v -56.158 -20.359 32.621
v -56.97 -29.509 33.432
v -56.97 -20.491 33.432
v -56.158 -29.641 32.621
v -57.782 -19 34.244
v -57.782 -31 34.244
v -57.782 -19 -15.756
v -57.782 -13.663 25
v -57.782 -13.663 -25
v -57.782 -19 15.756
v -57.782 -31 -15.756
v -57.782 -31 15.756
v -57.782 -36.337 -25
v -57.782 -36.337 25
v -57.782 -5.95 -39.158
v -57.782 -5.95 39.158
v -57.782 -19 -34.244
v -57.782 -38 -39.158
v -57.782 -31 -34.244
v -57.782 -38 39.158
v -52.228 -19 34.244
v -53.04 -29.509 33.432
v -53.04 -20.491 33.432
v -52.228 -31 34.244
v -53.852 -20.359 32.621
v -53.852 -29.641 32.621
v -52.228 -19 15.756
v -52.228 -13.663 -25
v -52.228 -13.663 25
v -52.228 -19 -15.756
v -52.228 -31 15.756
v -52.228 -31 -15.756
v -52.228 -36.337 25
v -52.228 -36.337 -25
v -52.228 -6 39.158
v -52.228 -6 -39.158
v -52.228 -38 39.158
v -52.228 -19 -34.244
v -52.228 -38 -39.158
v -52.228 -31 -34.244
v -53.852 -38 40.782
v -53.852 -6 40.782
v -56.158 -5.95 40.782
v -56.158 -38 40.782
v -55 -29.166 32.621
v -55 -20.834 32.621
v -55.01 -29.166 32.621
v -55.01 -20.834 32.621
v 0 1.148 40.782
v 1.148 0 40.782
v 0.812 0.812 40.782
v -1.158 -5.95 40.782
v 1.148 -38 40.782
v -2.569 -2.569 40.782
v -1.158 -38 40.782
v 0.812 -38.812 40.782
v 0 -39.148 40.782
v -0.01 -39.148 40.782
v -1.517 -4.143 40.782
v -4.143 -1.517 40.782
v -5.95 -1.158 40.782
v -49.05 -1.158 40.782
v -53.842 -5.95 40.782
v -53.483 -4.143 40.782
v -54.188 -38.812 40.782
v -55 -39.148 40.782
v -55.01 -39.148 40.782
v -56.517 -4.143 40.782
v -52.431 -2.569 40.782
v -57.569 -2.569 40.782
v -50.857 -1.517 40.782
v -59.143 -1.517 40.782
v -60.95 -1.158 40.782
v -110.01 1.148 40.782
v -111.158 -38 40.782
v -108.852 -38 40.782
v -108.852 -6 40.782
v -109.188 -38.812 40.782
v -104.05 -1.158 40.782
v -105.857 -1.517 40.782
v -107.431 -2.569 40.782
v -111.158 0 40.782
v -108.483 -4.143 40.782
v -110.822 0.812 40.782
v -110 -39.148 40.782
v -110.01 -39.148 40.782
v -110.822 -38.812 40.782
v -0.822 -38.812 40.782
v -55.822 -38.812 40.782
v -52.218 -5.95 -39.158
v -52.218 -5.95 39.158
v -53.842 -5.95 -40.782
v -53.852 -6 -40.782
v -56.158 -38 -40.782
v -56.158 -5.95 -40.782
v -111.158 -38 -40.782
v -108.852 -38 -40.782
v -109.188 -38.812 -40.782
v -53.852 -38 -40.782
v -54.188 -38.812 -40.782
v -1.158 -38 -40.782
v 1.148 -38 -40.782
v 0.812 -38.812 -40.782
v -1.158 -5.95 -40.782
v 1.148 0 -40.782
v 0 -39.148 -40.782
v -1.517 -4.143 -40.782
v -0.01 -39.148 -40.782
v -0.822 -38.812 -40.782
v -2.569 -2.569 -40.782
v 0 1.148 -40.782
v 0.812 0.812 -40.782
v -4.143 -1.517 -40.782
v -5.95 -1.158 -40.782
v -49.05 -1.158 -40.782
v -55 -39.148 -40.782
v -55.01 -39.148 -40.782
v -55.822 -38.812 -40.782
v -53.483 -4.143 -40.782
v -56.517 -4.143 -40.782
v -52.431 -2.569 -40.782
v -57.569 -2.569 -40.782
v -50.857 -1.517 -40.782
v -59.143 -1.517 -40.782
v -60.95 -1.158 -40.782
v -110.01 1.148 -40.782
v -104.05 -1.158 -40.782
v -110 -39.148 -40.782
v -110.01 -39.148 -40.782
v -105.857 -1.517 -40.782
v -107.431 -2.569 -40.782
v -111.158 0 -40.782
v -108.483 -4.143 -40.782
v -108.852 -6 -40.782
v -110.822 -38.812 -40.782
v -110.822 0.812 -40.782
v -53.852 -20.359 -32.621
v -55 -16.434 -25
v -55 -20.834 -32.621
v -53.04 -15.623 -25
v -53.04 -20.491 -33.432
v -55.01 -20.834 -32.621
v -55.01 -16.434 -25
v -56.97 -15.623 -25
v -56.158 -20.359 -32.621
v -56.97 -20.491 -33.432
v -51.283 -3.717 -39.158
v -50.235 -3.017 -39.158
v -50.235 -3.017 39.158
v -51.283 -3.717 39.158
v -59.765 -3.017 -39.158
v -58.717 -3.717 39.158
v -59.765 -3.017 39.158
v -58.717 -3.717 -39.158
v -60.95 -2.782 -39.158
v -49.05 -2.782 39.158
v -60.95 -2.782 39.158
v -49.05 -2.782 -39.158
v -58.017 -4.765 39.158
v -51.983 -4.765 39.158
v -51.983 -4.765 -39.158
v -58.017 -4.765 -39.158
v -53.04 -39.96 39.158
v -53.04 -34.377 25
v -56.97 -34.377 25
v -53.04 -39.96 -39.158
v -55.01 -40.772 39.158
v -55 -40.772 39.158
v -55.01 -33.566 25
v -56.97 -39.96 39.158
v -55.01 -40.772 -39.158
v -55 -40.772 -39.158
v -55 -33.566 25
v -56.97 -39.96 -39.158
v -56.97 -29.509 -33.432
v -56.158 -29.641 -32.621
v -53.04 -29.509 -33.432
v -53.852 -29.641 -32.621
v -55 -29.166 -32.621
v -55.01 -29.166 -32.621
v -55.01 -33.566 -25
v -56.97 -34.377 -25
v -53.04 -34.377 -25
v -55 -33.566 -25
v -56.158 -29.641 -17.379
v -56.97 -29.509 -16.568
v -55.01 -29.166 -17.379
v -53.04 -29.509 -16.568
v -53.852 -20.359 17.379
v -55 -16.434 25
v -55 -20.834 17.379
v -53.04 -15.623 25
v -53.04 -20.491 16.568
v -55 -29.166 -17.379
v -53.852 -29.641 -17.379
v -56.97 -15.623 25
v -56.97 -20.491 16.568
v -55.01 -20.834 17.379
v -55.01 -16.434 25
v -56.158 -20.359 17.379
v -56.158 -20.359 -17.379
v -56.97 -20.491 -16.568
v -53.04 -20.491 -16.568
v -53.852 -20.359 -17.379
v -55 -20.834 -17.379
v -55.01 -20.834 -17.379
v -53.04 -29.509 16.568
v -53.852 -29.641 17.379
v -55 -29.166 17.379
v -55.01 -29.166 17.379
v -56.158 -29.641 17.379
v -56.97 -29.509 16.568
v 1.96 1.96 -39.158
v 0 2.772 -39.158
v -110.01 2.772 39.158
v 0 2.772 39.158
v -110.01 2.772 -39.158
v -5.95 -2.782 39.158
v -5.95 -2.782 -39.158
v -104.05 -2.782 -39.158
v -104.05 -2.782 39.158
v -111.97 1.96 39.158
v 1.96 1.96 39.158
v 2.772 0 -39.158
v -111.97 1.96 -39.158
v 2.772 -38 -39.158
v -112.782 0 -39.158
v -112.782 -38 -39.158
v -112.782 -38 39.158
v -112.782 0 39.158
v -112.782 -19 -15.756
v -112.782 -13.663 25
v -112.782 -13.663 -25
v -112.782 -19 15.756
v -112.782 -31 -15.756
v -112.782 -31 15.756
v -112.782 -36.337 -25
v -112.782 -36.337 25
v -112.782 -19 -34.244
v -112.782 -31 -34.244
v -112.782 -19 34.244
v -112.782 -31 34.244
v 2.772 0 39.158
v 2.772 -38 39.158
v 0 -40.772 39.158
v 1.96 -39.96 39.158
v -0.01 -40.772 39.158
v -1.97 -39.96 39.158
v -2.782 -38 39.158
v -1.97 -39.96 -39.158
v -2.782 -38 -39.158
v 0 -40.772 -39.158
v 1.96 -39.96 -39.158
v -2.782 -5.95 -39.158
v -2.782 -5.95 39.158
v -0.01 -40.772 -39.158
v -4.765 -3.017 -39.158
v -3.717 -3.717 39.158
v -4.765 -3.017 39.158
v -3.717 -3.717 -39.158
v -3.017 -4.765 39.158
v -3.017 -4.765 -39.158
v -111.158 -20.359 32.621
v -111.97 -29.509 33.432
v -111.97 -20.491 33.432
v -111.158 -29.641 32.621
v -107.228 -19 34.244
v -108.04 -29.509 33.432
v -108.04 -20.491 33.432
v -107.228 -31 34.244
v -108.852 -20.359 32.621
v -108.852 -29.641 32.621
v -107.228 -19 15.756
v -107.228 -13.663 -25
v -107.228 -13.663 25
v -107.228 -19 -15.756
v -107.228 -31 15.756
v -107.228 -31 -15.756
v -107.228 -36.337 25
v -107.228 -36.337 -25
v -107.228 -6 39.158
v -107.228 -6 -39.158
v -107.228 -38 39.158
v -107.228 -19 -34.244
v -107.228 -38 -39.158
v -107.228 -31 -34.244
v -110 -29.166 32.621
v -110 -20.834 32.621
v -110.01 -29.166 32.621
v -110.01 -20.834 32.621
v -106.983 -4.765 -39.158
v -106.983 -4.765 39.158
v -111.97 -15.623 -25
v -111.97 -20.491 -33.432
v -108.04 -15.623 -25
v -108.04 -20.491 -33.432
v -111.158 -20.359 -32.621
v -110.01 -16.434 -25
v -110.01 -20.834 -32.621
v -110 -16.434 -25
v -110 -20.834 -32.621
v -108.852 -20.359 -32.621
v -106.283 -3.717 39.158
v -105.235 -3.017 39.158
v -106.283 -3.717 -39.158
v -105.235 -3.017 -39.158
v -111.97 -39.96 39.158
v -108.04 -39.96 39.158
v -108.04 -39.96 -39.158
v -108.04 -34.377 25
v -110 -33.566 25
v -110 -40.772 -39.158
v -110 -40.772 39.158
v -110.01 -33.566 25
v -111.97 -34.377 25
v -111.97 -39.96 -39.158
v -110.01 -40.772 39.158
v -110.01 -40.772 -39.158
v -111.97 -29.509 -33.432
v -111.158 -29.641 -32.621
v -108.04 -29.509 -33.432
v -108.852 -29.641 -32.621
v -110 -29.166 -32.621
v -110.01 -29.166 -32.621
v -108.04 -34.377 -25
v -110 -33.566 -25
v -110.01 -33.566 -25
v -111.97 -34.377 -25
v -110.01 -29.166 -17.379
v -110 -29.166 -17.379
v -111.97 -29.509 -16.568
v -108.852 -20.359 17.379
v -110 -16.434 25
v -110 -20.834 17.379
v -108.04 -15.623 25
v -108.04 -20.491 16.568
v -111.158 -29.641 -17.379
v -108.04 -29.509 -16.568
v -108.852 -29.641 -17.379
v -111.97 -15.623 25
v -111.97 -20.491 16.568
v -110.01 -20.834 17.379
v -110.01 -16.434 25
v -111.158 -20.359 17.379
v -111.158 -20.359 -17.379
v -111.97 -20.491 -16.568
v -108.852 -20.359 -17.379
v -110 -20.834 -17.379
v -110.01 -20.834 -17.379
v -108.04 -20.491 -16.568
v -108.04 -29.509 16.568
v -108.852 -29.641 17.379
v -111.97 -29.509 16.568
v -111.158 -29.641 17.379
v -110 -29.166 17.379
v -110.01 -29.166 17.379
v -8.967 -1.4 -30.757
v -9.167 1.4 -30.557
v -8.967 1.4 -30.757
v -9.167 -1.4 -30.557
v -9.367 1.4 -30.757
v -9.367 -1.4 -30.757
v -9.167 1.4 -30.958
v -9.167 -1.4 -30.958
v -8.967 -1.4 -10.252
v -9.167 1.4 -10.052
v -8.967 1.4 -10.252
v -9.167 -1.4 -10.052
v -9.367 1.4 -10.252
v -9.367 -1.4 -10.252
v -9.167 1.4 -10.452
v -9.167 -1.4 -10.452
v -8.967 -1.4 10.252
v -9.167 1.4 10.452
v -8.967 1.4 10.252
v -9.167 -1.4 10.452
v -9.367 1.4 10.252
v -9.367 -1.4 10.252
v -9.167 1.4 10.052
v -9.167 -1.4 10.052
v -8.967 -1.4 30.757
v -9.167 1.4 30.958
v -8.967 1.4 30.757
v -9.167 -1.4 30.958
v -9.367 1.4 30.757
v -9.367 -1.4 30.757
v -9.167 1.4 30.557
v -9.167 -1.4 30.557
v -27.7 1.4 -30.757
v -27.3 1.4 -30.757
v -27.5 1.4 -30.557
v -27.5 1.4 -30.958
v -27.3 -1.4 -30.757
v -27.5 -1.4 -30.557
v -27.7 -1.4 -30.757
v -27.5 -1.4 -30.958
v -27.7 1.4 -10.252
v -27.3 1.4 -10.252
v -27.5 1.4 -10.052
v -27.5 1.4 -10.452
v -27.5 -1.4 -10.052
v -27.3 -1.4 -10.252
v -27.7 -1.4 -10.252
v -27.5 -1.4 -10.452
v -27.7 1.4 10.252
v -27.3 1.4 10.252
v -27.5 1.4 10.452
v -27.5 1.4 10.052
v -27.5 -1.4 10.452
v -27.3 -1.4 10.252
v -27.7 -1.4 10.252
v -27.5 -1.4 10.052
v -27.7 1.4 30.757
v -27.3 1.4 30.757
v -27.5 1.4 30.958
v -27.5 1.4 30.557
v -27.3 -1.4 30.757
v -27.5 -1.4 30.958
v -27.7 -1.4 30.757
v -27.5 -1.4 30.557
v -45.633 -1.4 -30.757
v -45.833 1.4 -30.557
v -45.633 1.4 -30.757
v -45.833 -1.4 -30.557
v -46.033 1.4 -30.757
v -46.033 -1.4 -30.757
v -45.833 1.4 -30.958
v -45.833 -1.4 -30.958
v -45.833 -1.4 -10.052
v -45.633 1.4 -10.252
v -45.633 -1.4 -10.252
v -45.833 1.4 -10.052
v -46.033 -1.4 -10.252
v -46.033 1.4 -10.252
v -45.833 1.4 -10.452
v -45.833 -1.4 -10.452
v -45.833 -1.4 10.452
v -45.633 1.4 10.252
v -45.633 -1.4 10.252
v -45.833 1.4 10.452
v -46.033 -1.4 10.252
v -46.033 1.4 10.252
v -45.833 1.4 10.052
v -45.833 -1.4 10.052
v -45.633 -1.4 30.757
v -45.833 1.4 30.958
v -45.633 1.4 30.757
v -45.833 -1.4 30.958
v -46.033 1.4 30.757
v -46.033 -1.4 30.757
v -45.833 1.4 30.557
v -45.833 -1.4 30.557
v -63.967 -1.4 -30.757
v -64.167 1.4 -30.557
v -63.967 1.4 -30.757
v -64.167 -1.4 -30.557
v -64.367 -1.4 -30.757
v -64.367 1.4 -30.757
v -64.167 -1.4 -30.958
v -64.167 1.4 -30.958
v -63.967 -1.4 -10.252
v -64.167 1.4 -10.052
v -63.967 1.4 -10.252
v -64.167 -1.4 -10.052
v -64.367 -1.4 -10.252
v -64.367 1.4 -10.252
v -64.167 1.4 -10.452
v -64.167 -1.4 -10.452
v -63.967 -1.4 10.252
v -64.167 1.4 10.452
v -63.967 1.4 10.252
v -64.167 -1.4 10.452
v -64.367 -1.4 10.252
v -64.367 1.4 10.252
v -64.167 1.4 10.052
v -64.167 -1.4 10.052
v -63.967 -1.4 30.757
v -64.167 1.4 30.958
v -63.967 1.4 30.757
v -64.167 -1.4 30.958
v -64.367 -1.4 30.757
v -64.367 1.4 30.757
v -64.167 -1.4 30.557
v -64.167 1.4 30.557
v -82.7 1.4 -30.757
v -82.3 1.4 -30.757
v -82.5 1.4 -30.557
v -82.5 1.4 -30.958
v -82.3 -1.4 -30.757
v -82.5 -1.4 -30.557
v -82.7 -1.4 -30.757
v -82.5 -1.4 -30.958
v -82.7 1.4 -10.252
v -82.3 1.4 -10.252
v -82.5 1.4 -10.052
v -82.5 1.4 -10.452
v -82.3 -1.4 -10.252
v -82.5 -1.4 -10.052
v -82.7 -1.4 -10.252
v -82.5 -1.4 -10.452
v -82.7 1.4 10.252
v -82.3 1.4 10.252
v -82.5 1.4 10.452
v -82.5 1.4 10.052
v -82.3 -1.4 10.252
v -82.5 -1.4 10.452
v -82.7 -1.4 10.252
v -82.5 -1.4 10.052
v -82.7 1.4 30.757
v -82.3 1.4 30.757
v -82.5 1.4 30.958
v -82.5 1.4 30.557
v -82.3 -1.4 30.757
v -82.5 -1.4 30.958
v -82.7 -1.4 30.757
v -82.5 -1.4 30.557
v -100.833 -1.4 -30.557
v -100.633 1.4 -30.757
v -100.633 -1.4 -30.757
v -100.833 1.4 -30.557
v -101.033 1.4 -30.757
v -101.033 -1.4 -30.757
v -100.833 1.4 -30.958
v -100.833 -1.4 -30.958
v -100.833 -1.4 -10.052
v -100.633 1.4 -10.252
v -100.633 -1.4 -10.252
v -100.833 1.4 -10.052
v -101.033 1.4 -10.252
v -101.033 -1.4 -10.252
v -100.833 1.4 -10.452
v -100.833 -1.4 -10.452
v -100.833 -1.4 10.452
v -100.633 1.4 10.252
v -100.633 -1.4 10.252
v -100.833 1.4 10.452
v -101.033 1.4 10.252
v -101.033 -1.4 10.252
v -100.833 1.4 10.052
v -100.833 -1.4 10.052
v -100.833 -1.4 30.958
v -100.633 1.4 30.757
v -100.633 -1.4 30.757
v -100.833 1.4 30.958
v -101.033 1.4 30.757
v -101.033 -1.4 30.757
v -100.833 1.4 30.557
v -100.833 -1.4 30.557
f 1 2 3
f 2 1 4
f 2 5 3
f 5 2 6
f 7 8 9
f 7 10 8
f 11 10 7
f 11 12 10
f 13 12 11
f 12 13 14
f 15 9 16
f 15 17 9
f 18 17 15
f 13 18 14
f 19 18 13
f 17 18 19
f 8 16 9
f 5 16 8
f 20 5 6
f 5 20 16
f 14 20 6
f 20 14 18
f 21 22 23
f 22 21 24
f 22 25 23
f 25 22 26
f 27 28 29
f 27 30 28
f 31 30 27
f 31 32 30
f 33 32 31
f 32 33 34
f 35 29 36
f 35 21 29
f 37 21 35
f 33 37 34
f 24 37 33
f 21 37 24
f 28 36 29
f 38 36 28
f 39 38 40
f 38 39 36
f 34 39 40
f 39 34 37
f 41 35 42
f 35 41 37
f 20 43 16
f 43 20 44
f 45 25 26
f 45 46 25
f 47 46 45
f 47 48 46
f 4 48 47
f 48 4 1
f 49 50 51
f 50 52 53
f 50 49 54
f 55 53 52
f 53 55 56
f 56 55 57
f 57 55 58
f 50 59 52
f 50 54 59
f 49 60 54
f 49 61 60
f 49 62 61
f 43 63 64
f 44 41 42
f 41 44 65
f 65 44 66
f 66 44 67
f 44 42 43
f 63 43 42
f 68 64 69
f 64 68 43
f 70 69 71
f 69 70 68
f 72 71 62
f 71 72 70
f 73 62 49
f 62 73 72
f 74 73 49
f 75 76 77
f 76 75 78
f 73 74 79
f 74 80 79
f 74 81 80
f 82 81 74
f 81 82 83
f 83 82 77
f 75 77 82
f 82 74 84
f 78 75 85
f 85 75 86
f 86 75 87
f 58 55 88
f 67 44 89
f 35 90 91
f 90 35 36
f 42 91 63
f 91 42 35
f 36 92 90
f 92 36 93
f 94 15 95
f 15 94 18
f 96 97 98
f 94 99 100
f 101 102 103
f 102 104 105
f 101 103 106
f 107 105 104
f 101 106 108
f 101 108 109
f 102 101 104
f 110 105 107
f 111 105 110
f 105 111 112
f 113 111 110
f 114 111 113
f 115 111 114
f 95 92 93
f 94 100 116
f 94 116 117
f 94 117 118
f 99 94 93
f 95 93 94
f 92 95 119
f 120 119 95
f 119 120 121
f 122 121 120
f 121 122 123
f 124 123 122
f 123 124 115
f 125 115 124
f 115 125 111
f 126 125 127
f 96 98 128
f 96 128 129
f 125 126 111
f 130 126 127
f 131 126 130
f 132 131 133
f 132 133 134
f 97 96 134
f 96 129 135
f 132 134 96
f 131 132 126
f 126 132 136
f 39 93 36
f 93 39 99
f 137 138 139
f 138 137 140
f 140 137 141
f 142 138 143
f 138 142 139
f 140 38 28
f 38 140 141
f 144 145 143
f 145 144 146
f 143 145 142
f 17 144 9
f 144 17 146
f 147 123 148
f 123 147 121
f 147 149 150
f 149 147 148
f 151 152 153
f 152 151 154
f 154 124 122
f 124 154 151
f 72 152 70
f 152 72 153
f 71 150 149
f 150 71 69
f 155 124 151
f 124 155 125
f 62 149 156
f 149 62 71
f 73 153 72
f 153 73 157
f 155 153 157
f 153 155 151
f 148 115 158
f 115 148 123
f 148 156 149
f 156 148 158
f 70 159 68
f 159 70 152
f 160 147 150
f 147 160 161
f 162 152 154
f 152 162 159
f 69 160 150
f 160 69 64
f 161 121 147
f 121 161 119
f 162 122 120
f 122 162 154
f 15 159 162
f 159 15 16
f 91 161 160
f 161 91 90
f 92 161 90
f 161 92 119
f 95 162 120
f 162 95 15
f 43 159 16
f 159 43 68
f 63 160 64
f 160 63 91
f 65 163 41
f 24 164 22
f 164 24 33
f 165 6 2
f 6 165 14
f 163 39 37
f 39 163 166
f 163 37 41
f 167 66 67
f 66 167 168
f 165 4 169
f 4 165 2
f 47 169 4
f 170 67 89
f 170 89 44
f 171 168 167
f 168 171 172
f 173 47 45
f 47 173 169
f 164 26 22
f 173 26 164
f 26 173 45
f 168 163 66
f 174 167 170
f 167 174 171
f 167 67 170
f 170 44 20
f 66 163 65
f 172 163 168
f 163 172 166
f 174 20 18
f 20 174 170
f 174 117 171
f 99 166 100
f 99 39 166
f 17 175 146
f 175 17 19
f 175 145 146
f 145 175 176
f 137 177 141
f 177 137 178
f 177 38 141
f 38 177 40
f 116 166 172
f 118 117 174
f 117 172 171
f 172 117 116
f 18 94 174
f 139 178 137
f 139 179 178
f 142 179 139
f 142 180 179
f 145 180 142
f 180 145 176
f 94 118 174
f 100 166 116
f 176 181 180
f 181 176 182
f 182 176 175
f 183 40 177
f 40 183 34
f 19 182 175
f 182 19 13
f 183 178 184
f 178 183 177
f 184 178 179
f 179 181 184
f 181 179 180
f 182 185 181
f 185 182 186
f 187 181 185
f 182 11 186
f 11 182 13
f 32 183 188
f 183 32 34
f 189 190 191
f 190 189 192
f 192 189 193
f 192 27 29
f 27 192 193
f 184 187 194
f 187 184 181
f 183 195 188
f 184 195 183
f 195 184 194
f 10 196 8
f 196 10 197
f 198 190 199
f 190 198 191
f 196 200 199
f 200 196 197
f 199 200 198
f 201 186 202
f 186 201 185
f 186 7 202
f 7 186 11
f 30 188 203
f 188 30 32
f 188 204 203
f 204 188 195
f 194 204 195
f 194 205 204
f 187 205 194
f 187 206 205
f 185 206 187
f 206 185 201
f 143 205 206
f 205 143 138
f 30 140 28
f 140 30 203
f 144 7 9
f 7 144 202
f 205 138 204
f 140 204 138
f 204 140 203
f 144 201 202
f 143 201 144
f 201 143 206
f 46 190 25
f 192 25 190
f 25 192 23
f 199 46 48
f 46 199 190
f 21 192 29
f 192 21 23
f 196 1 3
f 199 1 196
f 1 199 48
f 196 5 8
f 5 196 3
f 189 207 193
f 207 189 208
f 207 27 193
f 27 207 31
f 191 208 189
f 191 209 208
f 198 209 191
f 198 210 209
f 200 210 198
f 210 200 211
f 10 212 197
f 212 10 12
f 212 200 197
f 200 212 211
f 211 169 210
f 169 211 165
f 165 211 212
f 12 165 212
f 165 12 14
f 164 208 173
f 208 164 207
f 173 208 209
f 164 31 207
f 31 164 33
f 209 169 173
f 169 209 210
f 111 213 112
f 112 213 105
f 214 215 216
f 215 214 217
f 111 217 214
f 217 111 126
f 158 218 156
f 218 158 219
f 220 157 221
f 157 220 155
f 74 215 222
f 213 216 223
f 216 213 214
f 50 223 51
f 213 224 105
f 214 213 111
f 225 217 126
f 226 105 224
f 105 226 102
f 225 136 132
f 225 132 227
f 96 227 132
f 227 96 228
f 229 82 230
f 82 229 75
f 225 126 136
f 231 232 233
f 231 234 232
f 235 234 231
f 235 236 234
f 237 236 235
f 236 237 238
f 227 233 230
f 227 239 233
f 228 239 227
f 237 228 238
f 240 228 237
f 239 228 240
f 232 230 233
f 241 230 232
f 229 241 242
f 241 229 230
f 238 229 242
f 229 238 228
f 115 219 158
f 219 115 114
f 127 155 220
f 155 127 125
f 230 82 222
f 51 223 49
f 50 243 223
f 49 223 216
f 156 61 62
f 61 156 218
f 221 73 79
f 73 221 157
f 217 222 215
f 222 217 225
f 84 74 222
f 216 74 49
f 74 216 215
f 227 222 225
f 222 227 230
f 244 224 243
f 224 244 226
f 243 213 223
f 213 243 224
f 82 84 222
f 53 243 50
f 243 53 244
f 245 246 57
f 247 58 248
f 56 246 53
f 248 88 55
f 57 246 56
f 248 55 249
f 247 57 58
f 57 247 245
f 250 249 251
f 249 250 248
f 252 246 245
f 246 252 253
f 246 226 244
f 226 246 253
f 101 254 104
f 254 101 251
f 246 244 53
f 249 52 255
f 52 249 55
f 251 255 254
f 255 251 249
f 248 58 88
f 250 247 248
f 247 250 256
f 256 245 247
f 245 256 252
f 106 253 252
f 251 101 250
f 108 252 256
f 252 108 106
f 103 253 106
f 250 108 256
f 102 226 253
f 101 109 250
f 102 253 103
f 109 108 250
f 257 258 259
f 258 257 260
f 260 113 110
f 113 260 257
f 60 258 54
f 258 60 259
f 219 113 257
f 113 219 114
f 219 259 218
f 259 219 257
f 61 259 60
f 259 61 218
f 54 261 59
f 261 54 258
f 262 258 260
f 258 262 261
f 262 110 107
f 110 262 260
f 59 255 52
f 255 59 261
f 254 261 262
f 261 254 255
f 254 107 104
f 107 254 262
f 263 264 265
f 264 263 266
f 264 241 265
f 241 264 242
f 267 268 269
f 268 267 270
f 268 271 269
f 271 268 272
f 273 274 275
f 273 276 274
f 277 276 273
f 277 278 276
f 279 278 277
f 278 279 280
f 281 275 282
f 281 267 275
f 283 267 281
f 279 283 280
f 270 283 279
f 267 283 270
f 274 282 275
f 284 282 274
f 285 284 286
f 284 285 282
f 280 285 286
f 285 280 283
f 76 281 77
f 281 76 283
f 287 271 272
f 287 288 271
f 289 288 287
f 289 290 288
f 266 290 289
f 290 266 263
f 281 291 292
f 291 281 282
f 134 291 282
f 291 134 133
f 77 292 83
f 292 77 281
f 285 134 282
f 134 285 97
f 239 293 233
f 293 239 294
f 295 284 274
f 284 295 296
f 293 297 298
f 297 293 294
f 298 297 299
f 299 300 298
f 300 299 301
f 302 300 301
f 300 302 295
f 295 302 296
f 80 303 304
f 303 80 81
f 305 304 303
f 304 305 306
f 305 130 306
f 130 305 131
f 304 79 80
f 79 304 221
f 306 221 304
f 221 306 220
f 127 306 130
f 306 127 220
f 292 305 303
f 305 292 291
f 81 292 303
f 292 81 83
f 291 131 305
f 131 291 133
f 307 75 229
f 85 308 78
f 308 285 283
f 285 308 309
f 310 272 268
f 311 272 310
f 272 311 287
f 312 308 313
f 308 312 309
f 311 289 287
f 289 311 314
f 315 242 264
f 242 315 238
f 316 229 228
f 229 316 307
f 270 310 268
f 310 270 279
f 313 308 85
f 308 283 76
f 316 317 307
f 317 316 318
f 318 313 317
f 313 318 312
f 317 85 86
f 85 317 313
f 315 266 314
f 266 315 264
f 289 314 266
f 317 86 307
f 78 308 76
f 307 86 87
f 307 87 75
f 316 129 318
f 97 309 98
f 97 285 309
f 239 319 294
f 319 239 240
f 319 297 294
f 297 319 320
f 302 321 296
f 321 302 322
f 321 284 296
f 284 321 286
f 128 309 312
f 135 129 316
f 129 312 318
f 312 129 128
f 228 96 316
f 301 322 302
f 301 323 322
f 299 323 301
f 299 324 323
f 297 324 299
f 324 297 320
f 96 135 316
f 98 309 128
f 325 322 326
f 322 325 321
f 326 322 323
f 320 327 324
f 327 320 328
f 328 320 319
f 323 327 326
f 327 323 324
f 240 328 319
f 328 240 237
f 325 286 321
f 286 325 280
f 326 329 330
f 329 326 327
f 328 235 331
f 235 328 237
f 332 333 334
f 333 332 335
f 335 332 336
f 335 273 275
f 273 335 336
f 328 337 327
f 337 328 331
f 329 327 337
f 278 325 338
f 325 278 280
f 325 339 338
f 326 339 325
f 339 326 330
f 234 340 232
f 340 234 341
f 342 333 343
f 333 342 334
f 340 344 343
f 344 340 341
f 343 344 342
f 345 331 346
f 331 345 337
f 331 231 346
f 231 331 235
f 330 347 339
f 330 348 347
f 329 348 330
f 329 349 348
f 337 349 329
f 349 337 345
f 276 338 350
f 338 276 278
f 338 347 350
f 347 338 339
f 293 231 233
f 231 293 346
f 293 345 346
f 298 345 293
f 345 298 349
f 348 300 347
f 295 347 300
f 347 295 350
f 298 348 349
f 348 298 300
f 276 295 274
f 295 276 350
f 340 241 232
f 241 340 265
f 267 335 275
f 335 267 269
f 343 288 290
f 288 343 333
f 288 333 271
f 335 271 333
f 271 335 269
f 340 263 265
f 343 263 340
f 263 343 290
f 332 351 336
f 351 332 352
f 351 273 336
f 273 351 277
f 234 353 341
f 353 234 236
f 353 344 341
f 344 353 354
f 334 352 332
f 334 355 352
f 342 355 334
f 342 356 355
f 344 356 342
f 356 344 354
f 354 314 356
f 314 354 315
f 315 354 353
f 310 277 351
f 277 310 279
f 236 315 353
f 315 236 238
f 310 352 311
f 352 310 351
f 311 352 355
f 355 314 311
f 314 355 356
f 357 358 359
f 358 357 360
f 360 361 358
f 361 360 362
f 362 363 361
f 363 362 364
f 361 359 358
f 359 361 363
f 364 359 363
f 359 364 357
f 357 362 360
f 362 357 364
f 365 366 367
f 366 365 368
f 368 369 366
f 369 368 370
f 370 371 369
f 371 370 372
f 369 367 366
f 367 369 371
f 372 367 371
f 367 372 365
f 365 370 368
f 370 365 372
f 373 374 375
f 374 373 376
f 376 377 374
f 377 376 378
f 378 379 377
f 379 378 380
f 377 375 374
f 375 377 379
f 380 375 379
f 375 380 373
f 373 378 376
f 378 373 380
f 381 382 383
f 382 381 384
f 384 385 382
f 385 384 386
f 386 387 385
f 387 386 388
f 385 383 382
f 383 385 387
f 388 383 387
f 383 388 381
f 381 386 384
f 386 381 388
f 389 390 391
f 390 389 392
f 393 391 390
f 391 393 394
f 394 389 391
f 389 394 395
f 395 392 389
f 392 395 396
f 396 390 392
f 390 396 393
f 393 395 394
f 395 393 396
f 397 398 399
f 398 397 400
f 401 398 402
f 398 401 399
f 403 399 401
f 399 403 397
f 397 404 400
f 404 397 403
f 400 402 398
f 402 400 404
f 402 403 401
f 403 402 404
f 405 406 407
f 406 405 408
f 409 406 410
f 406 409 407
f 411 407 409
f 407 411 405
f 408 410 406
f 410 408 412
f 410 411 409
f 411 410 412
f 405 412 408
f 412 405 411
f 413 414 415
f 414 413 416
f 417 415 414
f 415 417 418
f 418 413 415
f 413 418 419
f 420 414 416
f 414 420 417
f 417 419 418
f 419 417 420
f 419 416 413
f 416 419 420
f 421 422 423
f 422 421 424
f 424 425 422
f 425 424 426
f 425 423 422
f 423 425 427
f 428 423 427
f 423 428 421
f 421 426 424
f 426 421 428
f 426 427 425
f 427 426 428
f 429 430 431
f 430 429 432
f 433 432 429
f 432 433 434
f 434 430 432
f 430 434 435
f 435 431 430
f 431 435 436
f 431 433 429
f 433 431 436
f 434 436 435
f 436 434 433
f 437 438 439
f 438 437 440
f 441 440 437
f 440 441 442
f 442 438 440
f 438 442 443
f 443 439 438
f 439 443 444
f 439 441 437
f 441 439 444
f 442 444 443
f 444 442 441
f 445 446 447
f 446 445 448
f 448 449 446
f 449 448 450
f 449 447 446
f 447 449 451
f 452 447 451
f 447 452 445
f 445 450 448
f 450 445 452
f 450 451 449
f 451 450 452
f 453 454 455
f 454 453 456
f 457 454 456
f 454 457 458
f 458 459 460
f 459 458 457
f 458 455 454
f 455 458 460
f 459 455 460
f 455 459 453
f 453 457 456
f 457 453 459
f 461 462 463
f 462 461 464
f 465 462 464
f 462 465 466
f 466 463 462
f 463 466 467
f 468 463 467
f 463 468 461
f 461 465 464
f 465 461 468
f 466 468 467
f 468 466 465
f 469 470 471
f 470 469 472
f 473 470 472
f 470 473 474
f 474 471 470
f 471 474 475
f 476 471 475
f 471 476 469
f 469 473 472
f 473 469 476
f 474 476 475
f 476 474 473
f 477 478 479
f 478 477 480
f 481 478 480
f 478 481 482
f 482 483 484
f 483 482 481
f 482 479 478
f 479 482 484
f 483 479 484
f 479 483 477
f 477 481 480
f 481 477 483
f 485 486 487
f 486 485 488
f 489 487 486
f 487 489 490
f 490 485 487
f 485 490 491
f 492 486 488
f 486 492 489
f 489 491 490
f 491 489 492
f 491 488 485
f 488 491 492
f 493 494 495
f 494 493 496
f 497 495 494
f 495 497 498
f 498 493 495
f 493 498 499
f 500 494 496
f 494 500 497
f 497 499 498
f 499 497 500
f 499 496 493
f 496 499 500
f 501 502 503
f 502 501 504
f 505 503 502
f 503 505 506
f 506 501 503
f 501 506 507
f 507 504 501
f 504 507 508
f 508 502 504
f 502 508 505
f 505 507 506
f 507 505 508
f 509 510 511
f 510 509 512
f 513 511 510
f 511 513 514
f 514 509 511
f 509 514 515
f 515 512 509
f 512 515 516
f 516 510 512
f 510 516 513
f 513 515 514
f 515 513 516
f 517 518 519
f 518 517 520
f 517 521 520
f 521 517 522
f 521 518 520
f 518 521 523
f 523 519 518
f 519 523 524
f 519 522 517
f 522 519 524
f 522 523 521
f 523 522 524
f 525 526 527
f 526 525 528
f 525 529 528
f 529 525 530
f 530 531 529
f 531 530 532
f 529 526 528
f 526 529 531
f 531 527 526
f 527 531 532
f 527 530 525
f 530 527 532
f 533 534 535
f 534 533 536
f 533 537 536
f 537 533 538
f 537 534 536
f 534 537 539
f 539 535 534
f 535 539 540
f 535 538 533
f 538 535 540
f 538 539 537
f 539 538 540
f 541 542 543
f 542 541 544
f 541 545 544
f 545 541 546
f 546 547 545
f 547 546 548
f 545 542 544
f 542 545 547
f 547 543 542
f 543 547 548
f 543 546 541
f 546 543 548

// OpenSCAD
// Comments below are for the Thingiverse customizer.

/* [Dimensions] */

// Number of item slots.
slot_count = 2;

// Diameter of each hole (across hexagon points, not flats). In millimeters.
holding_diameter = 18;

// Height from top hole to bottom plate; how high up the objects will be held. In millimeters.
holding_height = 110;

// Diameter to make available for objects' heads above the hole. This affects both the spacing of holes and the separation from the wall. No effect if smaller than Holding Diameter. In millimeters.
object_clearance_diameter = 50;

// General corner rounding and fillet radius. In millimeters.
rounding_radius = 3;

// Extra flat surface beyond the minimum beside and in front of the holes. In millimeters.
extra_width = 1;

/* [Hidden] */
// end of customizable parameters, start of implementation stuff

epsilon = 0.01;
reinforcement_d = 0.4;

// aliases for customizer-names vs internal names
insertion_hole_d = holding_diameter;
insertion_height = holding_height;
clearance_d = max(object_clearance_diameter, holding_diameter + rounding_radius * 4 /* fudge */);
// aliases for shorthand
rr = rounding_radius;
rd = rounding_radius * 2;
slot_spacing = clearance_d;

// calculated
clearance_r = clearance_d / 2;
hole_center_y = clearance_r;
round_bar_d = rd + epsilon;
basic_width = insertion_hole_d + round_bar_d * 2 + extra_width * 2 + clearance_d * (slot_count - 1);
stickout = hole_center_y + insertion_hole_d / 2 + rr + extra_width;

// Coordinate scheme: x = vertical as mounted, y = depth (perpendicular to wall), z = width

rotate([0, 0, 180])  // for better default view
main();

module main() {
    difference() {
        minkowski(convexity=10) {
            sphere(r=rounding_radius, $fn=8);
            
            shrunk_geometry();
        }
        
        reinforcement_neg();
    }
}

module shrunk_geometry() {
    // back plate
    translate([0, 0, -(basic_width - rd) / 2])
    cube([insertion_height, epsilon, basic_width - rd]);
    
    // base
    translate([0, 0, -(basic_width - rd) / 2])
    cube([epsilon, stickout, basic_width - rd]);
    fillet();

    translate([insertion_height / 2, 0, 0]) {
        ring();
        fillet();
        scale([-1, 1, 1]) fillet();
    }
    translate([insertion_height, 0, 0]) {
        ring();
        scale([-1, 1, 1]) fillet();
    }
}

module reinforcement_neg() {
    xn = 5;
    zn = 3;
    for (xi = [0:xn])
    for (zi = [0:zn]) {
        translate([(xi + 0.5) / (xn + 1) * insertion_height, 0, (zi - zn / 2) / (zn + 1) * (basic_width)])
        rotate([90, 0, 0])
        cylinder(d=reinforcement_d, h=rd - reinforcement_d * 8, center=true, $fn=4);
    }
}

module ring() {
    difference() {
        translate([0, 0, -(basic_width - rd) / 2])
        cube([epsilon, stickout, basic_width - rd]);
        
        for (i = [0:slot_count - 1]) {
            translate([0, hole_center_y, (i - slot_count / 2 + 0.5) * slot_spacing])
            rotate([0, 90, 0])
            rotate([0, 0, 90])
            cylinder(d=insertion_hole_d + rd, h=1000, center=true, $fn=6);
        }
    }
}

module fillet() {
    r = rd;
    h = basic_width - rd;
    rotate([0, 0, 180])
    translate([-r, -r, 0])
    difference() {
        translate([0, 0, -h / 2])
        cube([r, r, h]);
        cylinder(r=r, h=h + epsilon * 2, center=true, $fn=16);
    }
}
